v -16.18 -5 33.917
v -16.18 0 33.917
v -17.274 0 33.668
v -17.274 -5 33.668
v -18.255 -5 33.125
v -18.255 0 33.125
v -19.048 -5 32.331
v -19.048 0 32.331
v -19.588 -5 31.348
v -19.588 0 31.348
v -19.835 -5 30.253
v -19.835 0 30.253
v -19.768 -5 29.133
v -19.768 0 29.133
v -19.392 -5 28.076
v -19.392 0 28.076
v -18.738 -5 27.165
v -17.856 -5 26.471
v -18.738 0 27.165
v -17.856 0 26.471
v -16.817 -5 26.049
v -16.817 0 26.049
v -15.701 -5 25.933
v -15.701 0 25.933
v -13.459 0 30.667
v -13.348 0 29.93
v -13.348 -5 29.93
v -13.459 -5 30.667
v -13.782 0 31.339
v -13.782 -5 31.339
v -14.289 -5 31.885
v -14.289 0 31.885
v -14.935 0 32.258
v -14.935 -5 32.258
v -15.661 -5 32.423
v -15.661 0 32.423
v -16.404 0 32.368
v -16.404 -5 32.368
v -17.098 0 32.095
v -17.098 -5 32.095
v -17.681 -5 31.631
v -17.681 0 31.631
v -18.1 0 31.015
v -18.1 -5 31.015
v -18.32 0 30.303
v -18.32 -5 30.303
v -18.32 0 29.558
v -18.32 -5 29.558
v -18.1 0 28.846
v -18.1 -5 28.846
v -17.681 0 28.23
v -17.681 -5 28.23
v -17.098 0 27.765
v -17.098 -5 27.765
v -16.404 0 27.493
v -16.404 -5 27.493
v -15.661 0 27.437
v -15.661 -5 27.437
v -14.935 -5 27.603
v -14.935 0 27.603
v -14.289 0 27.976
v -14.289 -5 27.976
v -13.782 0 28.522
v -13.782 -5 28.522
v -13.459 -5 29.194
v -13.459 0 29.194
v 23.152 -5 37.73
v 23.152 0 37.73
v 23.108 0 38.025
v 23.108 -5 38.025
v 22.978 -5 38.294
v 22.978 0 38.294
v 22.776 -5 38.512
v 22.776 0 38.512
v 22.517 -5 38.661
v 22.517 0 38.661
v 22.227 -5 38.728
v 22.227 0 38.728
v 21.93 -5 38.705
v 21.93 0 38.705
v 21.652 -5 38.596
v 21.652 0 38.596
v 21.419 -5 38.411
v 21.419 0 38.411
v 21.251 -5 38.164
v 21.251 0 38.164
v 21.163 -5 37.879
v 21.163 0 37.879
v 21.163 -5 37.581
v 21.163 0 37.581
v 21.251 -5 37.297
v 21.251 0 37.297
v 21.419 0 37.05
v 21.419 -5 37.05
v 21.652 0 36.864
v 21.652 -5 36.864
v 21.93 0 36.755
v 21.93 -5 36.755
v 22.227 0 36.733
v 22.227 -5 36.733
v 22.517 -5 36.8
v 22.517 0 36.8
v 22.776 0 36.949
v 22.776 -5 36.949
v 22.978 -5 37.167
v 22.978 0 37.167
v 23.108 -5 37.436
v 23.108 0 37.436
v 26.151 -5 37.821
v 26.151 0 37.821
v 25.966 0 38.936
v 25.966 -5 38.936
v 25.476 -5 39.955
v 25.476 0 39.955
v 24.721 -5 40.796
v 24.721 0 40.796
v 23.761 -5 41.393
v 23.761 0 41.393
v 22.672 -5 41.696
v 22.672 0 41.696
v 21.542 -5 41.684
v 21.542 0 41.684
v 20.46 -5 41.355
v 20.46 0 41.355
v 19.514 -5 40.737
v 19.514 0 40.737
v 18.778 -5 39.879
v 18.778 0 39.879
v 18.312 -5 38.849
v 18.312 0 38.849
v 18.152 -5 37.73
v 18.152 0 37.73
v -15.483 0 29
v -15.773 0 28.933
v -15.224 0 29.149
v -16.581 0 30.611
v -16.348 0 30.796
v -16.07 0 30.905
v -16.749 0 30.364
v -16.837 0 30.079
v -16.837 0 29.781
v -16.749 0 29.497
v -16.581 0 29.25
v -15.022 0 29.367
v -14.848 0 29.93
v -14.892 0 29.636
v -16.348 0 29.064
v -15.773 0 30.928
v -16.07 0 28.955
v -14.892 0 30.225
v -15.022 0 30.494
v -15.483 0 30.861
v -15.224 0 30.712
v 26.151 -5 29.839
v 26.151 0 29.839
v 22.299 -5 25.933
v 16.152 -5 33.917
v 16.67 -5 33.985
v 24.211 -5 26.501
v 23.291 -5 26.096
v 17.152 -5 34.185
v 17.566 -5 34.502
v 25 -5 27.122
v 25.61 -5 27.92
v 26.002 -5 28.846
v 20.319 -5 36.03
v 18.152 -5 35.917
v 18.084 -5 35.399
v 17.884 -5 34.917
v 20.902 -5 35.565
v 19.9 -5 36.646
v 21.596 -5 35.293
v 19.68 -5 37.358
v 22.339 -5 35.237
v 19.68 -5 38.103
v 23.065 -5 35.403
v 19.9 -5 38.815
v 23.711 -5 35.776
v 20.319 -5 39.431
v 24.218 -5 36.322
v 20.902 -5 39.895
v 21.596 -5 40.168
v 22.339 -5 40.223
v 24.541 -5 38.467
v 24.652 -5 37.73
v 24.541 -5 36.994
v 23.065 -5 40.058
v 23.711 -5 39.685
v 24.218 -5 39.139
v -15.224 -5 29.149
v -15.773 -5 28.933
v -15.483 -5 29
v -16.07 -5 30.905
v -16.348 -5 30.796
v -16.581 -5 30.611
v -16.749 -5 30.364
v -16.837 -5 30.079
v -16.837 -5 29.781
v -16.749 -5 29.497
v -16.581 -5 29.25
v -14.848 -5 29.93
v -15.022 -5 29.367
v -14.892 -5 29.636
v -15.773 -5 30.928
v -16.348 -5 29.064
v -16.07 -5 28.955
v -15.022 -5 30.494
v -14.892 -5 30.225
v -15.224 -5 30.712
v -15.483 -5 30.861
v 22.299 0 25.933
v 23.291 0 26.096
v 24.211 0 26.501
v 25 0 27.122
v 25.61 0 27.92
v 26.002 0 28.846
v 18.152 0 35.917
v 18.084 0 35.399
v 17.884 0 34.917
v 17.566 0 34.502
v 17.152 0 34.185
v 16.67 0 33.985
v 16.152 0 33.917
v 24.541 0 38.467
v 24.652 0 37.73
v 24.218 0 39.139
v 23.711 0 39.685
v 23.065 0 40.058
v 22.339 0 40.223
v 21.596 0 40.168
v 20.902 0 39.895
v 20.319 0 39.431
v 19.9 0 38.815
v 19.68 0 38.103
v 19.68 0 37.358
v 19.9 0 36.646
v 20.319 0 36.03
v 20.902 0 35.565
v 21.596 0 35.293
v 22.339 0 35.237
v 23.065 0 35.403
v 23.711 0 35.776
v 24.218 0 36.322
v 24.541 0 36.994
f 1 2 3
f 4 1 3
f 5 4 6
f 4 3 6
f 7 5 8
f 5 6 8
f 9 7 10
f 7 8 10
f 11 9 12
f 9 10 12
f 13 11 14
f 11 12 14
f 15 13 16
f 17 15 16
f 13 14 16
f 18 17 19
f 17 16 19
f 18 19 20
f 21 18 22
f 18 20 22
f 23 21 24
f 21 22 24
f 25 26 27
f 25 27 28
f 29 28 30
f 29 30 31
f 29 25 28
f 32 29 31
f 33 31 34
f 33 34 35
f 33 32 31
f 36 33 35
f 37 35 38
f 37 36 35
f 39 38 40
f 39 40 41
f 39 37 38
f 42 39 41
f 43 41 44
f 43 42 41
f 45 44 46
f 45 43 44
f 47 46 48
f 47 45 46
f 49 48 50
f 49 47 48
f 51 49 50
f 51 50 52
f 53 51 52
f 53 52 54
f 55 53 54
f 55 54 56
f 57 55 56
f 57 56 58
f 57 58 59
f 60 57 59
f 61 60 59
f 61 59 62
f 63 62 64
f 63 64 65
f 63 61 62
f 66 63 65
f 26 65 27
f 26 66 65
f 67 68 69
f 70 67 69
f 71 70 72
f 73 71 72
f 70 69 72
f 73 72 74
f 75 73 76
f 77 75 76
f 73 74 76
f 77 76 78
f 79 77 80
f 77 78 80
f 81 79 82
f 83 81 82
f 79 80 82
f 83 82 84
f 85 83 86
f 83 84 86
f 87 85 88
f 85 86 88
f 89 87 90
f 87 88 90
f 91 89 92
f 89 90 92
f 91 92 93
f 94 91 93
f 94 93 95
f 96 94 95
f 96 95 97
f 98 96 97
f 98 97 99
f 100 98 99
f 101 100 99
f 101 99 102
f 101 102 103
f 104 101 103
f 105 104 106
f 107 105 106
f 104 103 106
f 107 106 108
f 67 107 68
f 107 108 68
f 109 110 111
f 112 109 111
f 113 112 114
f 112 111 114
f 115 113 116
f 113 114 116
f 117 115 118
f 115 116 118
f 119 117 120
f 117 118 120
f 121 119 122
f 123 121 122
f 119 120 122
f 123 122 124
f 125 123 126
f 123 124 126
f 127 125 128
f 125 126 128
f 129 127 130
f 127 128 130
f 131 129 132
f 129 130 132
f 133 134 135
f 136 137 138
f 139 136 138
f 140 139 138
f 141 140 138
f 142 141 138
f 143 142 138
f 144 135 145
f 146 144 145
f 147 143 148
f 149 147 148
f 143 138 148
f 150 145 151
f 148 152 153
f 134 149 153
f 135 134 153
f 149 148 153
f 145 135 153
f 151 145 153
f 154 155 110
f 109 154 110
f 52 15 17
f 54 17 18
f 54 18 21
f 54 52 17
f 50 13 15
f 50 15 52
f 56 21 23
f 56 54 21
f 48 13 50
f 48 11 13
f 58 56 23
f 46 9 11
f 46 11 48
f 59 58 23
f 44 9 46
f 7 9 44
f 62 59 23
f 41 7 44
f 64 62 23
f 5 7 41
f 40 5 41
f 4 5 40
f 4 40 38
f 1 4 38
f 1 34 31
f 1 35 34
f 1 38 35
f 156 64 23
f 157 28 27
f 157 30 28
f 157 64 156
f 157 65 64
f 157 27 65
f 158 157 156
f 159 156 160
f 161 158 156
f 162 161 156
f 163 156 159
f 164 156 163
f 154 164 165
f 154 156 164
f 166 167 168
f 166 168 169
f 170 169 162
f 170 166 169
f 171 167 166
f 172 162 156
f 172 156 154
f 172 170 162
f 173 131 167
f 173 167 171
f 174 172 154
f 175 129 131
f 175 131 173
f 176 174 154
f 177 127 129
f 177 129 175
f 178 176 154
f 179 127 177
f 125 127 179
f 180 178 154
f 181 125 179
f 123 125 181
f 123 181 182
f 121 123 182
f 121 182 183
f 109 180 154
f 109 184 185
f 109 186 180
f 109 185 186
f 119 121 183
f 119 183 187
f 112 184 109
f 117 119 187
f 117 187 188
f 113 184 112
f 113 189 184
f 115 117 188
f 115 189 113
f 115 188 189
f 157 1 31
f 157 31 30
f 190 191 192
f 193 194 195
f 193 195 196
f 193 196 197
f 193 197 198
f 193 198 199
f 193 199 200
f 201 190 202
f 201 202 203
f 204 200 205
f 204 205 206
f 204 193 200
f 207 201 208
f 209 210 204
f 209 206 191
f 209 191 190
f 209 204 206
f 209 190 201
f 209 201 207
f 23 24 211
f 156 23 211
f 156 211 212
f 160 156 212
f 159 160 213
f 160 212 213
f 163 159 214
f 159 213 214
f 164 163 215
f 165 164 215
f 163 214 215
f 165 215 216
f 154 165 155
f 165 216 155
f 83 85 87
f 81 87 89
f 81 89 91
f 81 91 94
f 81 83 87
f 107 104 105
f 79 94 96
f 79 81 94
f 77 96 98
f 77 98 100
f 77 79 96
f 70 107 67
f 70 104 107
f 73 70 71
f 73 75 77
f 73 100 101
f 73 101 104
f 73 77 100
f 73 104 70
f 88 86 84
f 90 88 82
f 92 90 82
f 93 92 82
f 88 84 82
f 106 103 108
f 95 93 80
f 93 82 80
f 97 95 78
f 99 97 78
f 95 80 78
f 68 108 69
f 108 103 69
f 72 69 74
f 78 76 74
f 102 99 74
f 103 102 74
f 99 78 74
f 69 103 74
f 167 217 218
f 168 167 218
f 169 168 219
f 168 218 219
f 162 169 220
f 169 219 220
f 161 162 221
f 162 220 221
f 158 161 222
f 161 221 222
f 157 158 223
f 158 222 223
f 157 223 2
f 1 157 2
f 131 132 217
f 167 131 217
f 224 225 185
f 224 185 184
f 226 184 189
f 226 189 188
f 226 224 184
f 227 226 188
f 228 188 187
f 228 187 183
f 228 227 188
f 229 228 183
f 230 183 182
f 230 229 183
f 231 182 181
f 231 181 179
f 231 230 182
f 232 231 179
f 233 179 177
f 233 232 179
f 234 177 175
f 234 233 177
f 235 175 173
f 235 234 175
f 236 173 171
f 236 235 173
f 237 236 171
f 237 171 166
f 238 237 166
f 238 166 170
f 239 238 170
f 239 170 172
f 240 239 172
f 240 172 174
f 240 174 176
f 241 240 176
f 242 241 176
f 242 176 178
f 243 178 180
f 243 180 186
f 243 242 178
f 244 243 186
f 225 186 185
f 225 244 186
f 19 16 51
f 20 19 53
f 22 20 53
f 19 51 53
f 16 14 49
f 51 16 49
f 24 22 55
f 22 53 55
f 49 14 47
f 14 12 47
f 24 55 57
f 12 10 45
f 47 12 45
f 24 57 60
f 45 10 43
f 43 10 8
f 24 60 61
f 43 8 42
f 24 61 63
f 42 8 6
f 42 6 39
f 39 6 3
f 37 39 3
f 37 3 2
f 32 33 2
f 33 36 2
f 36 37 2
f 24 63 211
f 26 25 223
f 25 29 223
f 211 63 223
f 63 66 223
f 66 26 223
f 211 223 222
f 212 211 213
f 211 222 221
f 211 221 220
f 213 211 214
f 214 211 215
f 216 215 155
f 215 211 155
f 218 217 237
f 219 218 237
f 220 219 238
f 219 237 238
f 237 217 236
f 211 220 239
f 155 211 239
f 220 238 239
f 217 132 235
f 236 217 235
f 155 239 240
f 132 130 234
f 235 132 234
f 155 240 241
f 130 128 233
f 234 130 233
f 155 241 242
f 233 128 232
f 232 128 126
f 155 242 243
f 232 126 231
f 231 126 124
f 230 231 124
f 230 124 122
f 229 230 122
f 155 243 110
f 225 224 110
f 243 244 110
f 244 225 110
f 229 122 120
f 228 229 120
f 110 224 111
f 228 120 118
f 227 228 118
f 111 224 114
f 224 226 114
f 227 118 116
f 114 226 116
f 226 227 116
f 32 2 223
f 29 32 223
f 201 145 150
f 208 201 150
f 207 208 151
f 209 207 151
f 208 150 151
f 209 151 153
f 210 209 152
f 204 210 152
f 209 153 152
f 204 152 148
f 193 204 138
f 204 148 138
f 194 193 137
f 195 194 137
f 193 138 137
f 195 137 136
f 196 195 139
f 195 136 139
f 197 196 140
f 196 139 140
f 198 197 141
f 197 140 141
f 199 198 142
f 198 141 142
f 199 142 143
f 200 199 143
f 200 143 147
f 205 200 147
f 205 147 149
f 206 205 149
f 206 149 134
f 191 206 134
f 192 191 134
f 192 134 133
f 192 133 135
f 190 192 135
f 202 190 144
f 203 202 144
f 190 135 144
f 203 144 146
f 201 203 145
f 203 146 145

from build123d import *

# Parameters (mm, degrees)
F0_R     = 2.5
F1_DEPTH = 5
F0_R_2   = 1
F2_DEPTH = 5


with BuildPart() as f1:
    # F0 (on Front) → F1 (new body)
    with BuildSketch(Plane.XZ):
        with BuildLine():
            Line((16.152128, 33.916643), (-15.516141, 33.916643))
            Line((-15.516141, 33.916643), (-16.179602, 33.916643))
            ThreePointArc((-16.179602, 33.916643), (-19.840697, 29.690949), (-15.700783, 25.933128))
            Line((-15.700783, 25.933128), (22.005039, 25.933128))
            Line((22.005039, 25.933128), (22.299217, 25.933128))
            ThreePointArc((22.299217, 25.933128), (25.000334, 27.121914), (26.151094, 29.83945))
            Line((26.151094, 29.83945), (26.151094, 30.021396))
            Line((26.151094, 30.021396), (26.151094, 37.63945))
            Line((26.151094, 37.63945), (26.151094, 37.821396))
            ThreePointArc((26.151094, 37.821396), (22.106639, 41.730164), (18.152128, 37.730423))
            Line((18.152128, 37.730423), (18.152128, 35.916643))
            ThreePointArc((18.152128, 35.916643), (17.566342, 34.50243), (16.152128, 33.916643))
        make_face()
        with Locations((-15.847872, 29.930423)):
            Circle(F0_R, mode=Mode.SUBTRACT)
        with Locations((22.152128, 37.730423)):
            Circle(F0_R, mode=Mode.SUBTRACT)
    extrude(amount=F1_DEPTH)


with BuildPart() as f2:
    # F0 (on Front) → F2 (new body)
    with BuildSketch(Plane.XZ):
        with Locations((-15.847872, 29.930423)):
            Circle(F0_R_2)
        with Locations((22.152128, 37.730423)):
            Circle(F0_R_2)
    extrude(amount=F2_DEPTH)


solid = Compound([f1.part, f2.part])
